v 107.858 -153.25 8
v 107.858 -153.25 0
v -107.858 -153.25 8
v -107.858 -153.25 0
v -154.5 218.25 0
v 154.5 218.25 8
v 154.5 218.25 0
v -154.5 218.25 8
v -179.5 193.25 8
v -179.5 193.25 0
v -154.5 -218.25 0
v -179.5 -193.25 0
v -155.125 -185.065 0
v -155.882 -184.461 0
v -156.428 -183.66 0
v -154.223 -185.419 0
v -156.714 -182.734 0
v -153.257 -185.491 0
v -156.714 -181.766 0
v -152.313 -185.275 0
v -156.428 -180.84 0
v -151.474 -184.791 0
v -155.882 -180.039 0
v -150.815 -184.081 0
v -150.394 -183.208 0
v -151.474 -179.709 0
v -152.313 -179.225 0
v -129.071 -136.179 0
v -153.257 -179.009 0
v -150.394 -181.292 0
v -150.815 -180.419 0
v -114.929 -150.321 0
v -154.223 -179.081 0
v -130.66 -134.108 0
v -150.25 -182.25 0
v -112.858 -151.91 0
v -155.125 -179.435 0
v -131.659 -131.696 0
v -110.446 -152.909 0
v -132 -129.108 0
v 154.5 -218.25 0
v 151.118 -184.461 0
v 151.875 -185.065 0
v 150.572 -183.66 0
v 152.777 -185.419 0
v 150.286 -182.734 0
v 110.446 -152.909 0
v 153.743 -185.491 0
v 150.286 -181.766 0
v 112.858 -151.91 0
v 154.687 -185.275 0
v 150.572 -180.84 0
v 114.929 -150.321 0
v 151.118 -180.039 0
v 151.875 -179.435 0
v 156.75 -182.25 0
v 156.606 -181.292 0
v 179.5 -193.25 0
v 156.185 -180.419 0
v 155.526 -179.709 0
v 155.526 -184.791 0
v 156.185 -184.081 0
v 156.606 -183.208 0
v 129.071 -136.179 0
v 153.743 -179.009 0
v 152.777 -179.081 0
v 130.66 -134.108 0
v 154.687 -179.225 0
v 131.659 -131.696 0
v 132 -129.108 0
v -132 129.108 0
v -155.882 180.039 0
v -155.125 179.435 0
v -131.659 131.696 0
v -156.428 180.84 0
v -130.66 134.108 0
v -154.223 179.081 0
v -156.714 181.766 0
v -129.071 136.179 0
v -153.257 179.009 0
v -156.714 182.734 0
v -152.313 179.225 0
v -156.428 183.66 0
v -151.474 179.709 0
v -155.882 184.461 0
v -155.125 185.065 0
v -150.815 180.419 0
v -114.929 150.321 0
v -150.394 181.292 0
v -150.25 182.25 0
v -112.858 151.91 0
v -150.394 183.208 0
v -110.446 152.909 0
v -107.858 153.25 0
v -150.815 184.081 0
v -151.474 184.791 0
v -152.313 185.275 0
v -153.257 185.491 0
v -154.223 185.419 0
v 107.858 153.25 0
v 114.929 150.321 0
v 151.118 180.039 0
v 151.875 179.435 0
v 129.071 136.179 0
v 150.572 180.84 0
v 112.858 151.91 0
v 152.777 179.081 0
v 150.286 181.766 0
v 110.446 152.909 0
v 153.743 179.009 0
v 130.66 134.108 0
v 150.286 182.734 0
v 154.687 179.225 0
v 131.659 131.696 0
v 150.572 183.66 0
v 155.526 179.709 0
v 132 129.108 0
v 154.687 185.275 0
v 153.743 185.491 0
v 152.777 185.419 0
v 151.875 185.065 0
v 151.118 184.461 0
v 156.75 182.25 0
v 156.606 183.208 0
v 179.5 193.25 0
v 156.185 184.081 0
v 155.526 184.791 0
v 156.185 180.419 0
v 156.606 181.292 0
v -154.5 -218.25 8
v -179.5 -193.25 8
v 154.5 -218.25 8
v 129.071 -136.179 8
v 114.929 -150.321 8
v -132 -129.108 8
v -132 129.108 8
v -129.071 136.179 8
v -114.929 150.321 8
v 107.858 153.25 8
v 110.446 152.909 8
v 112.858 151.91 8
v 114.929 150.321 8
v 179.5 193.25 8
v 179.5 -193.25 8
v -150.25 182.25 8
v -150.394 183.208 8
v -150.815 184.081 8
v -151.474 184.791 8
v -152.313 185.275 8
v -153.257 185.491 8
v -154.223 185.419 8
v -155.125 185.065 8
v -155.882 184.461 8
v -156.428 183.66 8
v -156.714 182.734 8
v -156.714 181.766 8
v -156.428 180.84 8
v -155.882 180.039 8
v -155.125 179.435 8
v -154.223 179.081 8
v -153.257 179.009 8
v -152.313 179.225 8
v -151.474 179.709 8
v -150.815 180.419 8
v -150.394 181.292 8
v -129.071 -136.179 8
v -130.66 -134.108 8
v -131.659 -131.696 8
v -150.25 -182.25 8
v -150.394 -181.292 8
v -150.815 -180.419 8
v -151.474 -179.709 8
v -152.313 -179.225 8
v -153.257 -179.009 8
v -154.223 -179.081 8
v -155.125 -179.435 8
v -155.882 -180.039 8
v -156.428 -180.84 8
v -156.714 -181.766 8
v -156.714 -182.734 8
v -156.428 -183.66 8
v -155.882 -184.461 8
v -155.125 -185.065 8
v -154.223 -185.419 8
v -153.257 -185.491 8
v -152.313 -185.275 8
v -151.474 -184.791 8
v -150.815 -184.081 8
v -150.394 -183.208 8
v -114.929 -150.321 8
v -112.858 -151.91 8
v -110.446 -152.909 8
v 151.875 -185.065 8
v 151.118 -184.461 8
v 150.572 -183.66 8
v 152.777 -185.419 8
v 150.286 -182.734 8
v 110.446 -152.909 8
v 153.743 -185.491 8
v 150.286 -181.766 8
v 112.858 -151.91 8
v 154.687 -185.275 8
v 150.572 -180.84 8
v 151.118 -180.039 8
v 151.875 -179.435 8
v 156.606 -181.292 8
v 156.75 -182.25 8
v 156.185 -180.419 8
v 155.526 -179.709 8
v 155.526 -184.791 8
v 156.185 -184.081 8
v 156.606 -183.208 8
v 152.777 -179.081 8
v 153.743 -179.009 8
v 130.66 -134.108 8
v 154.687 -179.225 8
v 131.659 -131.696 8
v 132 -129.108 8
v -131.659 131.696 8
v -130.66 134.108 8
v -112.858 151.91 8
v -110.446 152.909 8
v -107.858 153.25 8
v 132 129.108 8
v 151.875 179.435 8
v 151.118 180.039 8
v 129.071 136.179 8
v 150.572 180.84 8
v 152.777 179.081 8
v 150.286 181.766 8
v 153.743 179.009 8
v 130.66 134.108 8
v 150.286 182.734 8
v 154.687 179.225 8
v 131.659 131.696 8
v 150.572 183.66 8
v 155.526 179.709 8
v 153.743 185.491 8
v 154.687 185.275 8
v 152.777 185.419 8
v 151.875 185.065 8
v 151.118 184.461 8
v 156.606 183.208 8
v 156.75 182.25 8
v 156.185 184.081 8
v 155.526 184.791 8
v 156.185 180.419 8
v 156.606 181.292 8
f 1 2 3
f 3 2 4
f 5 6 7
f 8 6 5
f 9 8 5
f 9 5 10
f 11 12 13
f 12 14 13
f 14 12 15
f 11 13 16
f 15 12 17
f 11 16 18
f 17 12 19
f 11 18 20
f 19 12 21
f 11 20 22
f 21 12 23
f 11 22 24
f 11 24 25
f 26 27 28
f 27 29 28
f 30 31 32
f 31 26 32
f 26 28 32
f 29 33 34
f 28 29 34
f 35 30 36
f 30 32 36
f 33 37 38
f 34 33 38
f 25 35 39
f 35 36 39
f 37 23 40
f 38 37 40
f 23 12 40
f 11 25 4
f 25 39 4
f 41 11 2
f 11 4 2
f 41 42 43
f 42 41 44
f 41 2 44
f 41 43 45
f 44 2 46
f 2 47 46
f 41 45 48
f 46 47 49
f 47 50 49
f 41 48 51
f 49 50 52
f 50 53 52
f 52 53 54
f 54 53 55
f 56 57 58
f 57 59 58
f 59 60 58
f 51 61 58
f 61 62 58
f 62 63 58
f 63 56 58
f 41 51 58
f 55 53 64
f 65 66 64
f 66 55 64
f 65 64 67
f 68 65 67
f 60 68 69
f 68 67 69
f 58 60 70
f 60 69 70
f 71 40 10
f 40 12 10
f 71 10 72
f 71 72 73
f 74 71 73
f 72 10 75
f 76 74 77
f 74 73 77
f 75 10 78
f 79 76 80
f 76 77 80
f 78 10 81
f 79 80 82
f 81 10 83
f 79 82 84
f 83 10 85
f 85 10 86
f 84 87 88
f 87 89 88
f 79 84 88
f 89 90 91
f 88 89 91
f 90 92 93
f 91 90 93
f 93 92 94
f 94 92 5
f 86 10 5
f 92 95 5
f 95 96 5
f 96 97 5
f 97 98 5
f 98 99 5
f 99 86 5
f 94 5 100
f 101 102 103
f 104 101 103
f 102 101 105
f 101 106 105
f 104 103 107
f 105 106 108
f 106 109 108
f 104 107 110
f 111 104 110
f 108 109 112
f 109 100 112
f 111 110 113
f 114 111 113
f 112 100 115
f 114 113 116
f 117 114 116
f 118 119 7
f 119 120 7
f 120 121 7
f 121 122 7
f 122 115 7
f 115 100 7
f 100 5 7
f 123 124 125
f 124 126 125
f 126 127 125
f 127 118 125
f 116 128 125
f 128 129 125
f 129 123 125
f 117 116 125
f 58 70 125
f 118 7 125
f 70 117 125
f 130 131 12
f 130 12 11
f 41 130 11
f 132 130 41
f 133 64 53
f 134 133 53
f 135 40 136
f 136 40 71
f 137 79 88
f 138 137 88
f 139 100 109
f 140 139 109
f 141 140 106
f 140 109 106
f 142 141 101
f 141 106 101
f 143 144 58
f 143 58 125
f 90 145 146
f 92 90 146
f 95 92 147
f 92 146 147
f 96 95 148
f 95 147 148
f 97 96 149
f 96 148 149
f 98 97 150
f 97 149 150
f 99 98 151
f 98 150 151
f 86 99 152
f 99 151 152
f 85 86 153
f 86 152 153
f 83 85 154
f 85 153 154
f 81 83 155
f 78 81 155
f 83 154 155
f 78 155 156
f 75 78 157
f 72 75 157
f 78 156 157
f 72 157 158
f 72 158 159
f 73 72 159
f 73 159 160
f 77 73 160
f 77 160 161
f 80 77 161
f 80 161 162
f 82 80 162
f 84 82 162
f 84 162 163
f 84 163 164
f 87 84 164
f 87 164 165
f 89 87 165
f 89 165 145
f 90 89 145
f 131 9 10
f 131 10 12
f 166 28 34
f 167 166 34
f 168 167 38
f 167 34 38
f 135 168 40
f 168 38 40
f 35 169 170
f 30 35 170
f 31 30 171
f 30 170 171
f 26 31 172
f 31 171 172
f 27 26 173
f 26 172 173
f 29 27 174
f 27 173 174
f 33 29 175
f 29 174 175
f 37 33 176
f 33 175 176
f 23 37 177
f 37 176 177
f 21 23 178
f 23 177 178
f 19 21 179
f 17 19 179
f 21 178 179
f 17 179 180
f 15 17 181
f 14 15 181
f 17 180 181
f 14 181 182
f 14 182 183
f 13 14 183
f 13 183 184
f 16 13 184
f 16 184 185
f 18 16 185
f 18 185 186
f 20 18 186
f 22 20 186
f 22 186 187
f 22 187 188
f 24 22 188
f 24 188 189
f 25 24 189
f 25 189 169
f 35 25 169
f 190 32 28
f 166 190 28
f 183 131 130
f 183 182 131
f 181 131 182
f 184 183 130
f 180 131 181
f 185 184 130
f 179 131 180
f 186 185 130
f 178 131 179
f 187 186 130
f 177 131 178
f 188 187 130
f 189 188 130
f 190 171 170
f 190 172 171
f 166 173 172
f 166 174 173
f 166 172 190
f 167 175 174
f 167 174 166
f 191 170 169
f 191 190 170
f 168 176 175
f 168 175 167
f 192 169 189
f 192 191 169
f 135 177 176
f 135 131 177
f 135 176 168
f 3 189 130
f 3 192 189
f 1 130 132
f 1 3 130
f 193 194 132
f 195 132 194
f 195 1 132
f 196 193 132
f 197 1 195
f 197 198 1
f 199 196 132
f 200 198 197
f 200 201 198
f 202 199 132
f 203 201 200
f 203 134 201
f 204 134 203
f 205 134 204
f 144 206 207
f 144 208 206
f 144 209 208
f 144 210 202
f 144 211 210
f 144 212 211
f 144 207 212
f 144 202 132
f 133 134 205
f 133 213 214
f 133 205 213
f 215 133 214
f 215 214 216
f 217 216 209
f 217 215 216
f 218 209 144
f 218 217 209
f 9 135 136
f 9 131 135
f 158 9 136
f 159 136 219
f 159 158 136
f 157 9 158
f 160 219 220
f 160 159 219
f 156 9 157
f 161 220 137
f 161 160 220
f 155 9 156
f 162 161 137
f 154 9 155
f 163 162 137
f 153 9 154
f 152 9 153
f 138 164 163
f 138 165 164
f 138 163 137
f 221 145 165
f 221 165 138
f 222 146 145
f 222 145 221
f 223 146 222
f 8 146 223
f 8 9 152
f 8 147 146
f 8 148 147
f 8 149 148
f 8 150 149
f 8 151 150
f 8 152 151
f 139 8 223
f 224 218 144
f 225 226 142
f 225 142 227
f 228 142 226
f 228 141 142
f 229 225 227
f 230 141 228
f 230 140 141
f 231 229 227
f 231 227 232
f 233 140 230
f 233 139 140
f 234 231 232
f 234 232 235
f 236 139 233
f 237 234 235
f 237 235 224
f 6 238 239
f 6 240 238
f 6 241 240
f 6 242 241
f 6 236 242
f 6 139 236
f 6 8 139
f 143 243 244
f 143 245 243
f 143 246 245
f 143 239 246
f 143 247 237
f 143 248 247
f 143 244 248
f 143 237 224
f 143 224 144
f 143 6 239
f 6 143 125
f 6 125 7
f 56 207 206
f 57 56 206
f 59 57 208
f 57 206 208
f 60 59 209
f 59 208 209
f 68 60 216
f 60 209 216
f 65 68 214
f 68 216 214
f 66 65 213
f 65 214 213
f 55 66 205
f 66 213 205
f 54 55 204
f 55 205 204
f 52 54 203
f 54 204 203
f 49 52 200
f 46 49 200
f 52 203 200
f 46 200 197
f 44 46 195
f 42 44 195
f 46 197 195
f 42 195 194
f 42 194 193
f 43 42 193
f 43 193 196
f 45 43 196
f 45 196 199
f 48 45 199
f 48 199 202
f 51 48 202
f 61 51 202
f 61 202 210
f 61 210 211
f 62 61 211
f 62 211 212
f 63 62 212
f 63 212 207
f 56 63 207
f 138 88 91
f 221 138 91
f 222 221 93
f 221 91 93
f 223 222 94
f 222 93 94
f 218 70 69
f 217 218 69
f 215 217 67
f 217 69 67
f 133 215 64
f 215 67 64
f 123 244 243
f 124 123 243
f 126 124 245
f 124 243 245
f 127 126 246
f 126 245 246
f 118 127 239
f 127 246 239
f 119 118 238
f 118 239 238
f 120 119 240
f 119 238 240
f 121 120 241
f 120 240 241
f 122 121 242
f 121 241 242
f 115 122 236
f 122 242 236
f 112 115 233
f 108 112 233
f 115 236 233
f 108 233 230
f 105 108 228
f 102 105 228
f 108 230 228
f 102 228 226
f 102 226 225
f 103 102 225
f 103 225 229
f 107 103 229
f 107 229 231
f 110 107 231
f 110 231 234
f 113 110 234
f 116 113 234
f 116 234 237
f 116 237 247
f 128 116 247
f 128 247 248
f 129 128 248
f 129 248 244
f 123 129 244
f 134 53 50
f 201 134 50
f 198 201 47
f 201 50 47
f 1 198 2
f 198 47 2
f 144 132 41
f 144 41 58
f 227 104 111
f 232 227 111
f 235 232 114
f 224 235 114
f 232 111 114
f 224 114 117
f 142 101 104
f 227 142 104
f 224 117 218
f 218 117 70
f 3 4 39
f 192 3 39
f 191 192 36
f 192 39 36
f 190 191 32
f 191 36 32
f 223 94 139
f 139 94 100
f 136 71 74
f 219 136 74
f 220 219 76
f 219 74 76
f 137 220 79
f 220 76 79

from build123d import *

# Parameters (mm, degrees)
BOSS_EXTRUDE1_DEPTH        = 8
CUT_EXTRUDE1_DEPTH         = 283.696502476
F_6_5_6_5_DIAMETER_HOLE2_D = 6.5


with BuildPart() as part:
    # Sketch1 → Boss-Extrude1 (new body)
    with BuildSketch(Plane.XY.offset(8)):
        Polygon((-154.499999959, -218.249999957), (154.500000044, -218.249999957), (179.500000086, -193.249999916), (179.500000086, 193.249999916), (154.500000044, 218.249999957), (-154.499999959, 218.249999957), (-179.5, 193.249999916), (-179.5, -193.249999916), align=None)
    extrude(amount=-BOSS_EXTRUDE1_DEPTH)

    # Sketch2 → Cut-Extrude1 (cut, through all)
    with BuildSketch(Plane(origin=(0, 0, 0), x_dir=(-1, 0, 0), z_dir=(0, 0, -1))):
        with BuildLine():
            Line((-107.857864329, -153.249999987), (107.857864423, -153.249999987))
            ThreePointArc((107.857864423, -153.249999987), (111.684698748, -152.488795312), (114.928932237, -150.321067798))
            Line((114.928932237, -150.321067798), (129.071067861, -136.178932174))
            ThreePointArc((129.071067861, -136.178932174), (131.23879537, -132.934698692), (132.000000044, -129.107864376))
            Line((132.000000044, -129.107864376), (132.000000044, 129.107864376))
            ThreePointArc((132.000000044, 129.107864376), (131.23879537, 132.934698692), (129.071067861, 136.178932174))
            Line((129.071067861, 136.178932174), (114.928932237, 150.321067798))
            ThreePointArc((114.928932237, 150.321067798), (111.684698748, 152.488795312), (107.857864423, 153.249999987))
            Line((107.857864423, 153.249999987), (-107.857864329, 153.249999987))
            ThreePointArc((-107.857864329, 153.249999987), (-111.684698653, 152.488795312), (-114.928932143, 150.321067798))
            Line((-114.928932143, 150.321067798), (-129.071067767, 136.178932174))
            ThreePointArc((-129.071067767, 136.178932174), (-131.238795276, 132.934698692), (-131.999999949, 129.107864376))
            Line((-131.999999949, 129.107864376), (-131.999999949, -129.107864376))
            ThreePointArc((-131.999999949, -129.107864376), (-131.238795276, -132.934698692), (-129.071067767, -136.178932174))
            Line((-129.071067767, -136.178932174), (-114.928932143, -150.321067798))
            ThreePointArc((-114.928932143, -150.321067798), (-111.684698653, -152.488795312), (-107.857864329, -153.249999987))
        make_face()
    extrude(amount=-CUT_EXTRUDE1_DEPTH, mode=Mode.SUBTRACT)

    # Ø6.5 (6.5) Diameter Hole2 (through all)
    with Locations(Plane(origin=(0, 0, 0), x_dir=(-1, 0, 0), z_dir=(0, 0, -1))):
        with Locations((-153.5, -182.25), (153.5, -182.25), (-153.5, 182.25), (153.5, 182.25)):
            Hole(F_6_5_6_5_DIAMETER_HOLE2_D / 2)


solid = part.part
